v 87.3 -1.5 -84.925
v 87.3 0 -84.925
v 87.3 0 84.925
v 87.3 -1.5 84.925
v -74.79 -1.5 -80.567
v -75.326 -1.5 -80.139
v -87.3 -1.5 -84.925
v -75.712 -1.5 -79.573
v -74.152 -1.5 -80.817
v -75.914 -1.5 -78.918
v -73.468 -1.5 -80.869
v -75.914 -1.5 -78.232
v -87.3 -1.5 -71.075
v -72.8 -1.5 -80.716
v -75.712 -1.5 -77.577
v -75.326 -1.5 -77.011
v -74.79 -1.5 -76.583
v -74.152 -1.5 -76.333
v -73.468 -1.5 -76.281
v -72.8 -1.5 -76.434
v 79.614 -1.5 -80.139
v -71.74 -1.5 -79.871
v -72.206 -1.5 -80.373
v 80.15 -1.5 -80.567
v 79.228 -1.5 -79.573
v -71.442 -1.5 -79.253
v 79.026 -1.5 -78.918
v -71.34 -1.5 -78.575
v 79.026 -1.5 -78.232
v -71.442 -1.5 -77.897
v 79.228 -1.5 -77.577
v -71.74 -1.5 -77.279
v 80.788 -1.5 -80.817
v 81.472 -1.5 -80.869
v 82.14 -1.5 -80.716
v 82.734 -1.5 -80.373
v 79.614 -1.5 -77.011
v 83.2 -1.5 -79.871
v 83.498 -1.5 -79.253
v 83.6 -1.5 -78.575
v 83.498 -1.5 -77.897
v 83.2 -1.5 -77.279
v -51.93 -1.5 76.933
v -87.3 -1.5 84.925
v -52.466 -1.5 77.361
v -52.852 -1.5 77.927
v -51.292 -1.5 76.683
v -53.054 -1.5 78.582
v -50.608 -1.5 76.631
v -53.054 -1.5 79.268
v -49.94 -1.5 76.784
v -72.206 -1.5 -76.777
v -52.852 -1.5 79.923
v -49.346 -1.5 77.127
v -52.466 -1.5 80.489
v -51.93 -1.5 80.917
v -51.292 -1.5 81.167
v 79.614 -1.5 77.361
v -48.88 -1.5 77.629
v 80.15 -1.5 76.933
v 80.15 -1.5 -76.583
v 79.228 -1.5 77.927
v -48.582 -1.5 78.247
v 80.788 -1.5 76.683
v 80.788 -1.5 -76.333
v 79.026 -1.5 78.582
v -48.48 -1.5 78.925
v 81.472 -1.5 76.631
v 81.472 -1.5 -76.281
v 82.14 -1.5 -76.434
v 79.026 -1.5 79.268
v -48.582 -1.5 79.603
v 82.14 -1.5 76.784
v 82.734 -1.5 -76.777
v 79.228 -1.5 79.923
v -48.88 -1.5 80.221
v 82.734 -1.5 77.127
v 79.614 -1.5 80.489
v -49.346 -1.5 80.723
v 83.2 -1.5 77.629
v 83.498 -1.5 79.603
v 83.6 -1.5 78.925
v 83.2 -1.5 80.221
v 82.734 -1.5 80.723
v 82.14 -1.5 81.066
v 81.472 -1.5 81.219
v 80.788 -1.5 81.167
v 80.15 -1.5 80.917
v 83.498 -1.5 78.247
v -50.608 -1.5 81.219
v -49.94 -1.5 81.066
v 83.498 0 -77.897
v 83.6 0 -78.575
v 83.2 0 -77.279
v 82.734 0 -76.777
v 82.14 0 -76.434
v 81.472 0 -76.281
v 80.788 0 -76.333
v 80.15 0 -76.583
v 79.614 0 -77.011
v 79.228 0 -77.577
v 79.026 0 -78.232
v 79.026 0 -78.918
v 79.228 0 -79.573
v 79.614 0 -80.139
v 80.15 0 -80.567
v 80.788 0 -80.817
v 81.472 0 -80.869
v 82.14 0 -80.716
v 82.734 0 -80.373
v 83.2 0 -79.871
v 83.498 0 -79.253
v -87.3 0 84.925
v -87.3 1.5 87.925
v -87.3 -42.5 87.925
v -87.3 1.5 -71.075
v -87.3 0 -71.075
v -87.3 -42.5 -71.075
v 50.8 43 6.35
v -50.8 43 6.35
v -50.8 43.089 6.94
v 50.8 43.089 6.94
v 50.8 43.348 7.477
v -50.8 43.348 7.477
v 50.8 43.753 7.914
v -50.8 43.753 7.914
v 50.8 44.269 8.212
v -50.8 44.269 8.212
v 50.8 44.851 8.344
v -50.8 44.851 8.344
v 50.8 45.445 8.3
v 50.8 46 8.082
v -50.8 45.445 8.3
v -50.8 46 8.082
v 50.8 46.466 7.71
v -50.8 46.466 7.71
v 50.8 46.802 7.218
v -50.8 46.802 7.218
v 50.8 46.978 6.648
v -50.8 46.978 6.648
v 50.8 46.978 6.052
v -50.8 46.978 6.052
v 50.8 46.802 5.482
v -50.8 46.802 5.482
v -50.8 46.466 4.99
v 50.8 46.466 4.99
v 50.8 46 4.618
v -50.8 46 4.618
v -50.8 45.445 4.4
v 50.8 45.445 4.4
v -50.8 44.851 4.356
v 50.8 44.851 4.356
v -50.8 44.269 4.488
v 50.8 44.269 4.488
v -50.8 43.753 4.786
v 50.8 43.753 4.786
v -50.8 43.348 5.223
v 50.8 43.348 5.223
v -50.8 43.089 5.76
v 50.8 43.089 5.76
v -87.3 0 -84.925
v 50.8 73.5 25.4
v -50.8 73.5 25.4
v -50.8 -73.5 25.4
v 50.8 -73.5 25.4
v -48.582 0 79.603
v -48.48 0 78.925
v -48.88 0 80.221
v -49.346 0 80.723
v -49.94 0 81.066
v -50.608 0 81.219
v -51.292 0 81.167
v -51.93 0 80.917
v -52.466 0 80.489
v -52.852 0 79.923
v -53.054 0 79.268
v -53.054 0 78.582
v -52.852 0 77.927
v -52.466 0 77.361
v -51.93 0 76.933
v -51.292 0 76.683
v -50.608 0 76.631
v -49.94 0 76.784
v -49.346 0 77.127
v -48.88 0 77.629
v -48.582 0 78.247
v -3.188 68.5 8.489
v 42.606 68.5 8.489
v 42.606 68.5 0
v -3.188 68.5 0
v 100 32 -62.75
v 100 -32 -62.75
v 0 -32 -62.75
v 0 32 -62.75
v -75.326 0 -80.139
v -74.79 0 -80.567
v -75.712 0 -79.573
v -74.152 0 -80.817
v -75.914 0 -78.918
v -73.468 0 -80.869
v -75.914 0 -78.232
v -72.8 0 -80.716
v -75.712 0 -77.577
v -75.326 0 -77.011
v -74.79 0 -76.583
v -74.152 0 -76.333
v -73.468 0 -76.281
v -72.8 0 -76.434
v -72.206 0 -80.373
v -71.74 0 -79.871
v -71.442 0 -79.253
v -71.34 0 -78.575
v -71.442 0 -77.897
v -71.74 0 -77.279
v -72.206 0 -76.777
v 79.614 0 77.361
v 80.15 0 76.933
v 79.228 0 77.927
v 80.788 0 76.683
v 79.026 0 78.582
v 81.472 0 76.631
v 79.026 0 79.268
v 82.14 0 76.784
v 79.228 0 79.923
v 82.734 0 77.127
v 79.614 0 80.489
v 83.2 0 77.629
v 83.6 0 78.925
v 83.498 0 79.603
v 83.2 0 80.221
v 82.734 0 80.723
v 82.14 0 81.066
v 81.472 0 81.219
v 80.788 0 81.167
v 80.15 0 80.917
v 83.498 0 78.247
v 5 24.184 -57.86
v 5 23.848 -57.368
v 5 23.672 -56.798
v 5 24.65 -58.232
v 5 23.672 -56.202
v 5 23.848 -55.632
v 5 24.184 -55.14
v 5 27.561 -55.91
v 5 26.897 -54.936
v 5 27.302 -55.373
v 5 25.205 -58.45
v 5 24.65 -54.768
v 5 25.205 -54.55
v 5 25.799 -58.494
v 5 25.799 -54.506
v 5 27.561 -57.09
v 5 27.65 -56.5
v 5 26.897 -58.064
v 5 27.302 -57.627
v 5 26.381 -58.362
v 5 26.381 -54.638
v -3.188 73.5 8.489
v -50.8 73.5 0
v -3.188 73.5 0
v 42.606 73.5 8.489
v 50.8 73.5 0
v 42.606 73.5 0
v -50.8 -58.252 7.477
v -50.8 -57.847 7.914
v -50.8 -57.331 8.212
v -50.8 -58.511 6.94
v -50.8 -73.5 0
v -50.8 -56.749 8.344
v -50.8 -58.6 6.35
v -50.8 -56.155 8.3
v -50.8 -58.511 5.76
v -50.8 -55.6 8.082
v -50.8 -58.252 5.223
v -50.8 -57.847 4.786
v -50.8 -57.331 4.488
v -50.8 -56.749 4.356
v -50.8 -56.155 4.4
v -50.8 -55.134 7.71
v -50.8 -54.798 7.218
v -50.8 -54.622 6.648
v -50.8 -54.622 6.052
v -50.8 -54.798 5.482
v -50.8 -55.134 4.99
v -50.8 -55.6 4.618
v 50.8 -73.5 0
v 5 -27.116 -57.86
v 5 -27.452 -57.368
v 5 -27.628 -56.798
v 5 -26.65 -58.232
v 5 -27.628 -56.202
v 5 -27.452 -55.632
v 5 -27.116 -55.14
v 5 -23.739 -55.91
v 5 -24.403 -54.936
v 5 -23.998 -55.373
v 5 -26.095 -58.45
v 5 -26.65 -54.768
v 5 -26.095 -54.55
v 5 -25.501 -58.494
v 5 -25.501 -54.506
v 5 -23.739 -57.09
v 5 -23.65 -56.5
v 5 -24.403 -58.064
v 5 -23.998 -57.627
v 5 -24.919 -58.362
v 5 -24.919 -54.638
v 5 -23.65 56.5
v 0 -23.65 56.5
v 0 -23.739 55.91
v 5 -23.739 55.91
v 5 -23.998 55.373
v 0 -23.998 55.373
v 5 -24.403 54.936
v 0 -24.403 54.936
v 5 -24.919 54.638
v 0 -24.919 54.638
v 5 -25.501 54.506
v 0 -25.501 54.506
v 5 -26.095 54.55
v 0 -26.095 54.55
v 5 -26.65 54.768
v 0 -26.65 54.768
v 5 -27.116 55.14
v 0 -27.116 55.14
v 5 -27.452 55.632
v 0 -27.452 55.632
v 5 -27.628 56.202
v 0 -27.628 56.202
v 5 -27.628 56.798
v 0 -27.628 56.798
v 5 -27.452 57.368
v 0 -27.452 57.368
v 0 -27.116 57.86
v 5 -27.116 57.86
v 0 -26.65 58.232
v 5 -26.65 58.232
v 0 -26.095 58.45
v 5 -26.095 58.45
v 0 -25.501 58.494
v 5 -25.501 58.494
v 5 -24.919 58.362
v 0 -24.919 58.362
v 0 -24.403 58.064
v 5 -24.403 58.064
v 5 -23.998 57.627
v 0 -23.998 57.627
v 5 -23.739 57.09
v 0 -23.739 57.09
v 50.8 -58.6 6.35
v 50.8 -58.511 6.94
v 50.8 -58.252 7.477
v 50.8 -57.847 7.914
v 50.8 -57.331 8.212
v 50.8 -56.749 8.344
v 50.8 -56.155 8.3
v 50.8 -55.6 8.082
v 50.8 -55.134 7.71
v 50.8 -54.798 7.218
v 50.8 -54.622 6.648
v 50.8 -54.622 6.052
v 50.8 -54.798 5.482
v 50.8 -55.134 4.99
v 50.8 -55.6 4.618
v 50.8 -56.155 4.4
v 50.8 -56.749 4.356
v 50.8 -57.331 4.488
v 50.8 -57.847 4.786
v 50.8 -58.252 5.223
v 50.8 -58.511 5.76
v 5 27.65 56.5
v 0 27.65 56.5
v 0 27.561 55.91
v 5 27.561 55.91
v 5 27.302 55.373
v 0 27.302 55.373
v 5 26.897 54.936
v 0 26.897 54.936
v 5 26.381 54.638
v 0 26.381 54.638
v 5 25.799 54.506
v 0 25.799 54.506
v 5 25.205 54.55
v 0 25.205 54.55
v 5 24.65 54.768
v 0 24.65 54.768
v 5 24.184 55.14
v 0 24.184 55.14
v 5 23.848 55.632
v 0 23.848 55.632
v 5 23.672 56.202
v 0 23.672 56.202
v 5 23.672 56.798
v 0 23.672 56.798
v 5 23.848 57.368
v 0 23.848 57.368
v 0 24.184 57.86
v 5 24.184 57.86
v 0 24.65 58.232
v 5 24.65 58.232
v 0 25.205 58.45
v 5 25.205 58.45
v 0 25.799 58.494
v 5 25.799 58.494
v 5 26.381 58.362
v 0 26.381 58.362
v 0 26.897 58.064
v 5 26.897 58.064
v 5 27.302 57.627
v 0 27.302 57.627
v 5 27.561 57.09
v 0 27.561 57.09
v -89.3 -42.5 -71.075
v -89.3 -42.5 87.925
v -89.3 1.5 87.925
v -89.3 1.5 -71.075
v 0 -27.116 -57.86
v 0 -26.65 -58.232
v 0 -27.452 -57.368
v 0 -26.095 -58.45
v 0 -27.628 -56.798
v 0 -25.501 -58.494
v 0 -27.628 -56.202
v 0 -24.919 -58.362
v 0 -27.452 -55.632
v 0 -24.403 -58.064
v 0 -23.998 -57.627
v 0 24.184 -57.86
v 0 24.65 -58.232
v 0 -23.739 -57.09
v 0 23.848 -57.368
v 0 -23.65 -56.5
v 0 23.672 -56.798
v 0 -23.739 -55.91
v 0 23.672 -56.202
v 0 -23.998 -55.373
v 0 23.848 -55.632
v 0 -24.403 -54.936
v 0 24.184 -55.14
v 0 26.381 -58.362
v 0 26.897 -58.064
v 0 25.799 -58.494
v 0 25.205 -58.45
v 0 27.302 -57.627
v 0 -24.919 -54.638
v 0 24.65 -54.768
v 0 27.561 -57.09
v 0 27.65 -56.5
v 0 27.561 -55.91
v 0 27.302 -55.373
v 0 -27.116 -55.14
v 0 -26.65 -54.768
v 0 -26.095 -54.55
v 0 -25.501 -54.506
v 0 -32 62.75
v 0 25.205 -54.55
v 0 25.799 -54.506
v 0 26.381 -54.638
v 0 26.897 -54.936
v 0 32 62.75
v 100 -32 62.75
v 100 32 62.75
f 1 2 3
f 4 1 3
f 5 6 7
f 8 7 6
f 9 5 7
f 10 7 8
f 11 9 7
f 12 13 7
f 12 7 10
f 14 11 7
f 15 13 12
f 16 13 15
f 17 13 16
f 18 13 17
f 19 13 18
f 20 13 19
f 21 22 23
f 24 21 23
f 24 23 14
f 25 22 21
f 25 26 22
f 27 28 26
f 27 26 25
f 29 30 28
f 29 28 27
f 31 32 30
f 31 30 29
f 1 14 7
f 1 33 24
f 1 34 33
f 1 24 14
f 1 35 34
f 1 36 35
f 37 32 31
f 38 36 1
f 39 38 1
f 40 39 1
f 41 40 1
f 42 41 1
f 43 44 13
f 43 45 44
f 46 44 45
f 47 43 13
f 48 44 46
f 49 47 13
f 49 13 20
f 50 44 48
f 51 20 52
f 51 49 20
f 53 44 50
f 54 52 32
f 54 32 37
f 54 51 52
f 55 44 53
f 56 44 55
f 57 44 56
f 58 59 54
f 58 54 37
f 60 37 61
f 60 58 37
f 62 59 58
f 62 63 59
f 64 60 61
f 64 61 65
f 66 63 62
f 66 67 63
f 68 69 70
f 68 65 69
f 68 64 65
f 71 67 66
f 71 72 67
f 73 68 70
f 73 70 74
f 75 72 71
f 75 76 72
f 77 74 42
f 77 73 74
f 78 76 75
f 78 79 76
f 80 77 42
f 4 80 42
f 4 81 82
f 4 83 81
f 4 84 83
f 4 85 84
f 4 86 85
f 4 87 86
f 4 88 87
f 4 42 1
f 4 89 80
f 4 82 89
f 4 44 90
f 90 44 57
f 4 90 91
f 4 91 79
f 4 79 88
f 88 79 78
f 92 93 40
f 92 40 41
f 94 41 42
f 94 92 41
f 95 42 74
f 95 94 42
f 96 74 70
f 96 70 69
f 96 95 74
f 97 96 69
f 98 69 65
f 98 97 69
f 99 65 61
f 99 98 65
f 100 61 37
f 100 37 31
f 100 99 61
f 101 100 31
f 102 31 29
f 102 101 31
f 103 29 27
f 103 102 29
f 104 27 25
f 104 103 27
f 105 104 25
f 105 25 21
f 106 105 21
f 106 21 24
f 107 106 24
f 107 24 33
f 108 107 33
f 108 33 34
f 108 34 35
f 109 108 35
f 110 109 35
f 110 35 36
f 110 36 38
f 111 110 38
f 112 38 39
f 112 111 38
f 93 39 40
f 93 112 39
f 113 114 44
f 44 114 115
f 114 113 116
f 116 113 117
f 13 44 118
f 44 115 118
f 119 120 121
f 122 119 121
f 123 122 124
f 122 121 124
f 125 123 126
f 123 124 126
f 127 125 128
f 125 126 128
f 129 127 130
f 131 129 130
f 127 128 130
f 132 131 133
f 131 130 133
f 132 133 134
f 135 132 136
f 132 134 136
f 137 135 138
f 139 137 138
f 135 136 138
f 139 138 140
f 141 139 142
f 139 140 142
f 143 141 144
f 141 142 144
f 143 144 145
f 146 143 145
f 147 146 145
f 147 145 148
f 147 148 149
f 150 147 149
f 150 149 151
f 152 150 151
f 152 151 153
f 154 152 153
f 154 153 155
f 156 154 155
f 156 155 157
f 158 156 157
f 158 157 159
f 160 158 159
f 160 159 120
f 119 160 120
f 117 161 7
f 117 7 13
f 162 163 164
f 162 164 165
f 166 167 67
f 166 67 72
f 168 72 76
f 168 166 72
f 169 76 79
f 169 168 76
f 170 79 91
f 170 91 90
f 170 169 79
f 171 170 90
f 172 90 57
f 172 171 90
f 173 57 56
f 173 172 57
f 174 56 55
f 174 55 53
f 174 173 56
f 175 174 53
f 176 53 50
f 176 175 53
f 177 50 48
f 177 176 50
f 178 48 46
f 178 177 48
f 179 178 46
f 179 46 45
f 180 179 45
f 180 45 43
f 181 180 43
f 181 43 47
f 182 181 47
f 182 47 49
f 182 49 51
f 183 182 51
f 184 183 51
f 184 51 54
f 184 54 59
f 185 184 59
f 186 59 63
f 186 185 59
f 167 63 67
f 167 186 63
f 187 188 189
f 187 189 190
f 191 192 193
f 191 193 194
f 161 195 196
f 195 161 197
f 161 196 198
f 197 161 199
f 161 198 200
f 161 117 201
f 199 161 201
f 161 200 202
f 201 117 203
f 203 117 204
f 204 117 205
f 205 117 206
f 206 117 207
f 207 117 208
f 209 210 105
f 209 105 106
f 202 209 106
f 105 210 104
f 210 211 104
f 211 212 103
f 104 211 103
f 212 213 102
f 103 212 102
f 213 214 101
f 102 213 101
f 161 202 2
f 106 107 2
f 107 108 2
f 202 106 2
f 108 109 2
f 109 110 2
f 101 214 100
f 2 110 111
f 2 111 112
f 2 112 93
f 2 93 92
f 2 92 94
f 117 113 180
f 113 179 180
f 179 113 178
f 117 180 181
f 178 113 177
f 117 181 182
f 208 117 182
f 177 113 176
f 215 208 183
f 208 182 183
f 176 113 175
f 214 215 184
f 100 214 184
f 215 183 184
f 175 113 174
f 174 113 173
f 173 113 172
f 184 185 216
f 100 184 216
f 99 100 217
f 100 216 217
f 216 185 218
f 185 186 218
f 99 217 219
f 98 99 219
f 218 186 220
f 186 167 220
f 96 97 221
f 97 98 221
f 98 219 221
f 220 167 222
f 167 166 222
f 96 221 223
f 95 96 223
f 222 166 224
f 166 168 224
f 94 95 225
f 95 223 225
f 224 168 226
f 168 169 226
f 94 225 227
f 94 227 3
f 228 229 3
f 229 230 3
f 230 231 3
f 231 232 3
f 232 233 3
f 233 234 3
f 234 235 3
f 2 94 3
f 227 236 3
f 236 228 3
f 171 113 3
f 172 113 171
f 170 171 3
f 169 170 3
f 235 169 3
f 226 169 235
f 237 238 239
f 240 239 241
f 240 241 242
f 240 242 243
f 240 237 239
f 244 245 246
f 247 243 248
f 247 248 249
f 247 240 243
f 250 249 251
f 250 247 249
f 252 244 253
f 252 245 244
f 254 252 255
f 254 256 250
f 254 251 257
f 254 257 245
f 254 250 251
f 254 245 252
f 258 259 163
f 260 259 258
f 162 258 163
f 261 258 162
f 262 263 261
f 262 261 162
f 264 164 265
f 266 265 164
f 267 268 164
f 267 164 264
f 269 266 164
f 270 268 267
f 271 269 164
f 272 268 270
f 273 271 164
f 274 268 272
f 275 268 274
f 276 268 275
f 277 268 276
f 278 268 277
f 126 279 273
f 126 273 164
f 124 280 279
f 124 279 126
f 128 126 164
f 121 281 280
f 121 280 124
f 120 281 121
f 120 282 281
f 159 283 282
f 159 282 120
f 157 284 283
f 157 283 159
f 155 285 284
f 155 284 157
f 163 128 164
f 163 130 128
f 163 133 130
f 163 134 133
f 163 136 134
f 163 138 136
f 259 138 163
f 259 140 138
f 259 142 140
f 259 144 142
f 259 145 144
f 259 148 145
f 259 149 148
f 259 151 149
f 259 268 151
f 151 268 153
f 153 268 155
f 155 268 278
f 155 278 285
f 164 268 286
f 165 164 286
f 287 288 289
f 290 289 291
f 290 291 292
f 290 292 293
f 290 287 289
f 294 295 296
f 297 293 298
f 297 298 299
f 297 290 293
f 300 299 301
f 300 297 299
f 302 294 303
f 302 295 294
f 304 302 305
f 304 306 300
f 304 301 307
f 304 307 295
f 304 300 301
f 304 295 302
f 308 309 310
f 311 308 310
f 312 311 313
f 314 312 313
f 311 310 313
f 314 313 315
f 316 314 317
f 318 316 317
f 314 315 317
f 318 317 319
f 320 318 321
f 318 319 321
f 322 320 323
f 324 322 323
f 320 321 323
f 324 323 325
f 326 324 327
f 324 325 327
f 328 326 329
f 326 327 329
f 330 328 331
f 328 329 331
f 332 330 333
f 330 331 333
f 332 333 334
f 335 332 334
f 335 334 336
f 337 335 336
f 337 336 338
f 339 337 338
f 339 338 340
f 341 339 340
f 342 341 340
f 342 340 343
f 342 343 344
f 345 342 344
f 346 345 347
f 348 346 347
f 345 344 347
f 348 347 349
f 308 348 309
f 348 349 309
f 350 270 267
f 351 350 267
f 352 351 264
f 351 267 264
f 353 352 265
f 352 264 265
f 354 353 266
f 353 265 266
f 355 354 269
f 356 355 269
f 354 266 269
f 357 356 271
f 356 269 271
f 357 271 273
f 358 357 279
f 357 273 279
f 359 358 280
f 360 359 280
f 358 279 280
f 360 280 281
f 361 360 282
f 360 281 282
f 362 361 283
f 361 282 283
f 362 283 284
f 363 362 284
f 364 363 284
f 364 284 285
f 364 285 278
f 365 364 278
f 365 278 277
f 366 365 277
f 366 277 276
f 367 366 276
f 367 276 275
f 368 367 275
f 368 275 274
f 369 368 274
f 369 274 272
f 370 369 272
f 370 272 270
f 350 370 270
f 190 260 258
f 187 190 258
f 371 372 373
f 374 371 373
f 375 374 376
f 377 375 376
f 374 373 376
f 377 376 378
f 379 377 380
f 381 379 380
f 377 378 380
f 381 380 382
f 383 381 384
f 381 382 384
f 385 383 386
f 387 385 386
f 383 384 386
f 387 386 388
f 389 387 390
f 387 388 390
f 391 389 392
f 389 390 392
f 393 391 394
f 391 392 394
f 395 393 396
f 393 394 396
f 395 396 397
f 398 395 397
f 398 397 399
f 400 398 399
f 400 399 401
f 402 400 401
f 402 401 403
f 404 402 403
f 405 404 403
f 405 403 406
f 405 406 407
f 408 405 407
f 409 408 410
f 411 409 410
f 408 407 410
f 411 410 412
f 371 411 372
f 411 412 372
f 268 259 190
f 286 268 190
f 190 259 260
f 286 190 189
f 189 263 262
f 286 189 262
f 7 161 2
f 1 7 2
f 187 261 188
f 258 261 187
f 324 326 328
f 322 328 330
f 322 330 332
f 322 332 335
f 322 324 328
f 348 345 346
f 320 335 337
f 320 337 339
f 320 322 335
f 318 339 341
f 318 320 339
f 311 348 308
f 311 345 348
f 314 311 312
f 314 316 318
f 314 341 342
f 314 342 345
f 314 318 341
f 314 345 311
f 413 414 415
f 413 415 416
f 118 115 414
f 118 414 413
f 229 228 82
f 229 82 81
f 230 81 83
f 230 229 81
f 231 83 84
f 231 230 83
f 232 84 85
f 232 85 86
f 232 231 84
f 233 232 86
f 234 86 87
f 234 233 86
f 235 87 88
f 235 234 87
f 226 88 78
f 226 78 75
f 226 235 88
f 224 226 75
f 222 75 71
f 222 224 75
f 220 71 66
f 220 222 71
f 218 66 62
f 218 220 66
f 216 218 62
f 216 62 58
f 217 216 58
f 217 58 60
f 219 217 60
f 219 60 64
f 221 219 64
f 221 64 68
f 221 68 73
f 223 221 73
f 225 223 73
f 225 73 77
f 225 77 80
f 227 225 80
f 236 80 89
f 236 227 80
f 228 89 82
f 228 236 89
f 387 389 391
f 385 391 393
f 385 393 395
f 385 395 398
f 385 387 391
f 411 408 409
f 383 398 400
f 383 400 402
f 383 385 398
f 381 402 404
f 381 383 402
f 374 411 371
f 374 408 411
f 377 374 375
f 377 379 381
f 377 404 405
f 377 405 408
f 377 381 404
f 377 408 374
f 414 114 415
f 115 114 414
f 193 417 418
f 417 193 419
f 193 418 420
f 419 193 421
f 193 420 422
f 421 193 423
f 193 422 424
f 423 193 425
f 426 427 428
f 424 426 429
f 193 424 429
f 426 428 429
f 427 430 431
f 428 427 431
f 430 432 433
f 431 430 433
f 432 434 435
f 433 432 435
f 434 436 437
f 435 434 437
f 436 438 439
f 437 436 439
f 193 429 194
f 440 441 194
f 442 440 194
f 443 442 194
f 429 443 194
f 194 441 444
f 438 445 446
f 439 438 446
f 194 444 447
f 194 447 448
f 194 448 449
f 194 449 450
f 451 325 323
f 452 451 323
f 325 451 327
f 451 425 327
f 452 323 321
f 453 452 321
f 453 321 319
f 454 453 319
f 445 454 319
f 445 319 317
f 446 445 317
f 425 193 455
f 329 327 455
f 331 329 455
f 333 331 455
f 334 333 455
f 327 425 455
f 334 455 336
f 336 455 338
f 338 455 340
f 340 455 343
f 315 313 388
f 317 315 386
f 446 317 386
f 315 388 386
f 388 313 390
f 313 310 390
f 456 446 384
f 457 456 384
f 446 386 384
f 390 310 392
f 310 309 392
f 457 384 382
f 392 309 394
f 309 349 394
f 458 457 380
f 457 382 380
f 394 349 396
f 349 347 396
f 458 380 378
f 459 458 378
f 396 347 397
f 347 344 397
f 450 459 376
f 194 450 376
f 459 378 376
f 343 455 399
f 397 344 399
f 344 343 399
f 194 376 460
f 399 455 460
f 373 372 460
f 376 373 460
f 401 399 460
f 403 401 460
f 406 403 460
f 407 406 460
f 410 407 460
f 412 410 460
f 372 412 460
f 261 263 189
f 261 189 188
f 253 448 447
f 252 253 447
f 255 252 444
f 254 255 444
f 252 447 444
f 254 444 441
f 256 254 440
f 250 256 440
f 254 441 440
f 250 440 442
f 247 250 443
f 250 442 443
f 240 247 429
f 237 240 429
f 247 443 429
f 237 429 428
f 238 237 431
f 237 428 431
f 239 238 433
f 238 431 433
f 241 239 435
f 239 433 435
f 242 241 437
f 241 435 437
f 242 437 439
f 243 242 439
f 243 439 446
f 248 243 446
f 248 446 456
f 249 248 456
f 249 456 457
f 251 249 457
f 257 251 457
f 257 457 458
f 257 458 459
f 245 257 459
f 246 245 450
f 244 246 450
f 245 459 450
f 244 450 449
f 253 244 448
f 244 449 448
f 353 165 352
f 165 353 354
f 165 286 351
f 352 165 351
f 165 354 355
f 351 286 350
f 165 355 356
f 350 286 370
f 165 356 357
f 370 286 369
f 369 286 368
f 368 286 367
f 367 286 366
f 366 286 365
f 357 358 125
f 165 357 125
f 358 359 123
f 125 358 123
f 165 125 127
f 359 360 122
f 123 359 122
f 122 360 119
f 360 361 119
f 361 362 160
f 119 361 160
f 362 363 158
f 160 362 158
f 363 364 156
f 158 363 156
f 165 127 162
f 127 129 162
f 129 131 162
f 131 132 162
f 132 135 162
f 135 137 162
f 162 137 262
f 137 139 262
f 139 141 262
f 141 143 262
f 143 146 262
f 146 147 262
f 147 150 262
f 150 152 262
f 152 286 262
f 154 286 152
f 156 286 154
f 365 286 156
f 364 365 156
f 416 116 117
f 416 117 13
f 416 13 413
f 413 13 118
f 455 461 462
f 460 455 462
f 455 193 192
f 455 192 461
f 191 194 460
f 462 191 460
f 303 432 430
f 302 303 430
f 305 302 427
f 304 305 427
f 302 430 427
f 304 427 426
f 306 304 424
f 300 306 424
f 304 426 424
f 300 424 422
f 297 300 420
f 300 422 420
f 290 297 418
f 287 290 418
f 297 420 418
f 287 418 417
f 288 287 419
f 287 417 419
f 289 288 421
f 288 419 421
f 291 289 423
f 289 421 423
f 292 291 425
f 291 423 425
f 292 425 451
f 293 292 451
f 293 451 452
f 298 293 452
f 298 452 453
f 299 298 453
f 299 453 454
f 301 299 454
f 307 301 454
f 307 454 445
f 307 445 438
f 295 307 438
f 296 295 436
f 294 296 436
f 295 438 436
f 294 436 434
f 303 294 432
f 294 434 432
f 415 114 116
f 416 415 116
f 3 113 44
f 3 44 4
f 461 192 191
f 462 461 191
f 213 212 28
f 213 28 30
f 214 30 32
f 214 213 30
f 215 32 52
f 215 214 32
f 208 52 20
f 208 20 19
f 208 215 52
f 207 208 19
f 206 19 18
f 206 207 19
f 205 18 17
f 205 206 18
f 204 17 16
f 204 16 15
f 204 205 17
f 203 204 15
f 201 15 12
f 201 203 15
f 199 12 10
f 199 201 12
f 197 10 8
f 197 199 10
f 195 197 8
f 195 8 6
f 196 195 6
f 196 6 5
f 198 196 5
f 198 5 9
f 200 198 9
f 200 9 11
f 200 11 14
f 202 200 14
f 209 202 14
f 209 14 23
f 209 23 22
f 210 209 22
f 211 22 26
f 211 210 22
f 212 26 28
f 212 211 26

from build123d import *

# Parameters (mm, degrees)
SKETCH_W        = 174.6
SKETCH_H        = 169.85
SKETCH_R        = 2.3
PAD_DEPTH       = 1.5
SKETCH001_W     = 159
SKETCH001_H     = 44
PAD001_DEPTH    = 2
SKETCH042_W     = 64
SKETCH042_H     = 125.5
PAD017_DEPTH    = 100
SKETCH043_R     = 2
POCKET_DEPTH    = 5
SKETCH044_W     = 101.6
SKETCH044_H     = 147
PAD018_DEPTH    = 25.4
SKETCH045_W     = 45.794352
SKETCH045_H     = 8.488647
POCKET001_DEPTH = 5
SKETCH046_R     = 2
POCKET002_DEPTH = 101.601


with BuildPart() as mobo:
    # Sketch → Pad (new body)
    with BuildSketch(Plane.XZ):
        Rectangle(SKETCH_W, SKETCH_H)
        with Locations((-73.64, -78.575)):
            Circle(SKETCH_R, mode=Mode.SUBTRACT)
        with Locations((81.3, -78.575)):
            Circle(SKETCH_R, mode=Mode.SUBTRACT)
        with Locations((81.3, 78.925)):
            Circle(SKETCH_R, mode=Mode.SUBTRACT)
        with Locations((-50.78, 78.925)):
            Circle(SKETCH_R, mode=Mode.SUBTRACT)
    extrude(amount=PAD_DEPTH)

    # Sketch001 (on Face4 of Pad) → Pad001 (join)
    with BuildSketch(Plane(origin=(-87.3, 0, 0), x_dir=(0, 0, -1), z_dir=(-1, 0, 0))):
        with Locations((-8.425, 20.5)):
            Rectangle(SKETCH001_W, SKETCH001_H)
    extrude(amount=PAD001_DEPTH)


with BuildPart() as psu:
    # Sketch042 → Pad017 (new body)
    with BuildSketch(Plane.YZ):
        Rectangle(SKETCH042_W, SKETCH042_H)
    extrude(amount=PAD017_DEPTH)

    # Sketch043 (on Face5 of Pad017) → Pocket (cut)
    with BuildSketch(Plane(origin=(0, 0, 0), x_dir=(0, 1, 0), z_dir=(-1, 0, 0))):
        with Locations((-25.65, -56.5)):
            Circle(SKETCH043_R)
        with Locations((25.65, -56.5)):
            Circle(SKETCH043_R)
        with Locations((25.65, 56.5)):
            Circle(SKETCH043_R)
        with Locations((-25.65, 56.5)):
            Circle(SKETCH043_R)
    extrude(amount=-POCKET_DEPTH, mode=Mode.SUBTRACT)


with BuildPart() as hdd:
    # Sketch044 → Pad018 (new body)
    with BuildSketch(Plane.XY):
        Rectangle(SKETCH044_W, SKETCH044_H)
    extrude(amount=PAD018_DEPTH)

    # Sketch045 (on Face3 of Pad018) → Pocket001 (cut)
    with BuildSketch(Plane(origin=(0, 73.5, 0), x_dir=(-1, 0, 0), z_dir=(0, 1, 0))):
        with Locations((-19.708751, 4.2443235)):
            Rectangle(SKETCH045_W, SKETCH045_H)
    extrude(amount=-POCKET001_DEPTH, mode=Mode.SUBTRACT)

    # Sketch046 (on Face2 of Pocket001) → Pocket002 (cut, through all)
    with BuildSketch(Plane(origin=(-50.8, 0, 0), x_dir=(0, -1, 0), z_dir=(-1, 0, 0))):
        with Locations((-45, 6.35)):
            Circle(SKETCH046_R)
        with Locations((56.6, 6.35)):
            Circle(SKETCH046_R)
    extrude(amount=-POCKET002_DEPTH, mode=Mode.SUBTRACT)


solid = Compound([mobo.part, psu.part, hdd.part])
